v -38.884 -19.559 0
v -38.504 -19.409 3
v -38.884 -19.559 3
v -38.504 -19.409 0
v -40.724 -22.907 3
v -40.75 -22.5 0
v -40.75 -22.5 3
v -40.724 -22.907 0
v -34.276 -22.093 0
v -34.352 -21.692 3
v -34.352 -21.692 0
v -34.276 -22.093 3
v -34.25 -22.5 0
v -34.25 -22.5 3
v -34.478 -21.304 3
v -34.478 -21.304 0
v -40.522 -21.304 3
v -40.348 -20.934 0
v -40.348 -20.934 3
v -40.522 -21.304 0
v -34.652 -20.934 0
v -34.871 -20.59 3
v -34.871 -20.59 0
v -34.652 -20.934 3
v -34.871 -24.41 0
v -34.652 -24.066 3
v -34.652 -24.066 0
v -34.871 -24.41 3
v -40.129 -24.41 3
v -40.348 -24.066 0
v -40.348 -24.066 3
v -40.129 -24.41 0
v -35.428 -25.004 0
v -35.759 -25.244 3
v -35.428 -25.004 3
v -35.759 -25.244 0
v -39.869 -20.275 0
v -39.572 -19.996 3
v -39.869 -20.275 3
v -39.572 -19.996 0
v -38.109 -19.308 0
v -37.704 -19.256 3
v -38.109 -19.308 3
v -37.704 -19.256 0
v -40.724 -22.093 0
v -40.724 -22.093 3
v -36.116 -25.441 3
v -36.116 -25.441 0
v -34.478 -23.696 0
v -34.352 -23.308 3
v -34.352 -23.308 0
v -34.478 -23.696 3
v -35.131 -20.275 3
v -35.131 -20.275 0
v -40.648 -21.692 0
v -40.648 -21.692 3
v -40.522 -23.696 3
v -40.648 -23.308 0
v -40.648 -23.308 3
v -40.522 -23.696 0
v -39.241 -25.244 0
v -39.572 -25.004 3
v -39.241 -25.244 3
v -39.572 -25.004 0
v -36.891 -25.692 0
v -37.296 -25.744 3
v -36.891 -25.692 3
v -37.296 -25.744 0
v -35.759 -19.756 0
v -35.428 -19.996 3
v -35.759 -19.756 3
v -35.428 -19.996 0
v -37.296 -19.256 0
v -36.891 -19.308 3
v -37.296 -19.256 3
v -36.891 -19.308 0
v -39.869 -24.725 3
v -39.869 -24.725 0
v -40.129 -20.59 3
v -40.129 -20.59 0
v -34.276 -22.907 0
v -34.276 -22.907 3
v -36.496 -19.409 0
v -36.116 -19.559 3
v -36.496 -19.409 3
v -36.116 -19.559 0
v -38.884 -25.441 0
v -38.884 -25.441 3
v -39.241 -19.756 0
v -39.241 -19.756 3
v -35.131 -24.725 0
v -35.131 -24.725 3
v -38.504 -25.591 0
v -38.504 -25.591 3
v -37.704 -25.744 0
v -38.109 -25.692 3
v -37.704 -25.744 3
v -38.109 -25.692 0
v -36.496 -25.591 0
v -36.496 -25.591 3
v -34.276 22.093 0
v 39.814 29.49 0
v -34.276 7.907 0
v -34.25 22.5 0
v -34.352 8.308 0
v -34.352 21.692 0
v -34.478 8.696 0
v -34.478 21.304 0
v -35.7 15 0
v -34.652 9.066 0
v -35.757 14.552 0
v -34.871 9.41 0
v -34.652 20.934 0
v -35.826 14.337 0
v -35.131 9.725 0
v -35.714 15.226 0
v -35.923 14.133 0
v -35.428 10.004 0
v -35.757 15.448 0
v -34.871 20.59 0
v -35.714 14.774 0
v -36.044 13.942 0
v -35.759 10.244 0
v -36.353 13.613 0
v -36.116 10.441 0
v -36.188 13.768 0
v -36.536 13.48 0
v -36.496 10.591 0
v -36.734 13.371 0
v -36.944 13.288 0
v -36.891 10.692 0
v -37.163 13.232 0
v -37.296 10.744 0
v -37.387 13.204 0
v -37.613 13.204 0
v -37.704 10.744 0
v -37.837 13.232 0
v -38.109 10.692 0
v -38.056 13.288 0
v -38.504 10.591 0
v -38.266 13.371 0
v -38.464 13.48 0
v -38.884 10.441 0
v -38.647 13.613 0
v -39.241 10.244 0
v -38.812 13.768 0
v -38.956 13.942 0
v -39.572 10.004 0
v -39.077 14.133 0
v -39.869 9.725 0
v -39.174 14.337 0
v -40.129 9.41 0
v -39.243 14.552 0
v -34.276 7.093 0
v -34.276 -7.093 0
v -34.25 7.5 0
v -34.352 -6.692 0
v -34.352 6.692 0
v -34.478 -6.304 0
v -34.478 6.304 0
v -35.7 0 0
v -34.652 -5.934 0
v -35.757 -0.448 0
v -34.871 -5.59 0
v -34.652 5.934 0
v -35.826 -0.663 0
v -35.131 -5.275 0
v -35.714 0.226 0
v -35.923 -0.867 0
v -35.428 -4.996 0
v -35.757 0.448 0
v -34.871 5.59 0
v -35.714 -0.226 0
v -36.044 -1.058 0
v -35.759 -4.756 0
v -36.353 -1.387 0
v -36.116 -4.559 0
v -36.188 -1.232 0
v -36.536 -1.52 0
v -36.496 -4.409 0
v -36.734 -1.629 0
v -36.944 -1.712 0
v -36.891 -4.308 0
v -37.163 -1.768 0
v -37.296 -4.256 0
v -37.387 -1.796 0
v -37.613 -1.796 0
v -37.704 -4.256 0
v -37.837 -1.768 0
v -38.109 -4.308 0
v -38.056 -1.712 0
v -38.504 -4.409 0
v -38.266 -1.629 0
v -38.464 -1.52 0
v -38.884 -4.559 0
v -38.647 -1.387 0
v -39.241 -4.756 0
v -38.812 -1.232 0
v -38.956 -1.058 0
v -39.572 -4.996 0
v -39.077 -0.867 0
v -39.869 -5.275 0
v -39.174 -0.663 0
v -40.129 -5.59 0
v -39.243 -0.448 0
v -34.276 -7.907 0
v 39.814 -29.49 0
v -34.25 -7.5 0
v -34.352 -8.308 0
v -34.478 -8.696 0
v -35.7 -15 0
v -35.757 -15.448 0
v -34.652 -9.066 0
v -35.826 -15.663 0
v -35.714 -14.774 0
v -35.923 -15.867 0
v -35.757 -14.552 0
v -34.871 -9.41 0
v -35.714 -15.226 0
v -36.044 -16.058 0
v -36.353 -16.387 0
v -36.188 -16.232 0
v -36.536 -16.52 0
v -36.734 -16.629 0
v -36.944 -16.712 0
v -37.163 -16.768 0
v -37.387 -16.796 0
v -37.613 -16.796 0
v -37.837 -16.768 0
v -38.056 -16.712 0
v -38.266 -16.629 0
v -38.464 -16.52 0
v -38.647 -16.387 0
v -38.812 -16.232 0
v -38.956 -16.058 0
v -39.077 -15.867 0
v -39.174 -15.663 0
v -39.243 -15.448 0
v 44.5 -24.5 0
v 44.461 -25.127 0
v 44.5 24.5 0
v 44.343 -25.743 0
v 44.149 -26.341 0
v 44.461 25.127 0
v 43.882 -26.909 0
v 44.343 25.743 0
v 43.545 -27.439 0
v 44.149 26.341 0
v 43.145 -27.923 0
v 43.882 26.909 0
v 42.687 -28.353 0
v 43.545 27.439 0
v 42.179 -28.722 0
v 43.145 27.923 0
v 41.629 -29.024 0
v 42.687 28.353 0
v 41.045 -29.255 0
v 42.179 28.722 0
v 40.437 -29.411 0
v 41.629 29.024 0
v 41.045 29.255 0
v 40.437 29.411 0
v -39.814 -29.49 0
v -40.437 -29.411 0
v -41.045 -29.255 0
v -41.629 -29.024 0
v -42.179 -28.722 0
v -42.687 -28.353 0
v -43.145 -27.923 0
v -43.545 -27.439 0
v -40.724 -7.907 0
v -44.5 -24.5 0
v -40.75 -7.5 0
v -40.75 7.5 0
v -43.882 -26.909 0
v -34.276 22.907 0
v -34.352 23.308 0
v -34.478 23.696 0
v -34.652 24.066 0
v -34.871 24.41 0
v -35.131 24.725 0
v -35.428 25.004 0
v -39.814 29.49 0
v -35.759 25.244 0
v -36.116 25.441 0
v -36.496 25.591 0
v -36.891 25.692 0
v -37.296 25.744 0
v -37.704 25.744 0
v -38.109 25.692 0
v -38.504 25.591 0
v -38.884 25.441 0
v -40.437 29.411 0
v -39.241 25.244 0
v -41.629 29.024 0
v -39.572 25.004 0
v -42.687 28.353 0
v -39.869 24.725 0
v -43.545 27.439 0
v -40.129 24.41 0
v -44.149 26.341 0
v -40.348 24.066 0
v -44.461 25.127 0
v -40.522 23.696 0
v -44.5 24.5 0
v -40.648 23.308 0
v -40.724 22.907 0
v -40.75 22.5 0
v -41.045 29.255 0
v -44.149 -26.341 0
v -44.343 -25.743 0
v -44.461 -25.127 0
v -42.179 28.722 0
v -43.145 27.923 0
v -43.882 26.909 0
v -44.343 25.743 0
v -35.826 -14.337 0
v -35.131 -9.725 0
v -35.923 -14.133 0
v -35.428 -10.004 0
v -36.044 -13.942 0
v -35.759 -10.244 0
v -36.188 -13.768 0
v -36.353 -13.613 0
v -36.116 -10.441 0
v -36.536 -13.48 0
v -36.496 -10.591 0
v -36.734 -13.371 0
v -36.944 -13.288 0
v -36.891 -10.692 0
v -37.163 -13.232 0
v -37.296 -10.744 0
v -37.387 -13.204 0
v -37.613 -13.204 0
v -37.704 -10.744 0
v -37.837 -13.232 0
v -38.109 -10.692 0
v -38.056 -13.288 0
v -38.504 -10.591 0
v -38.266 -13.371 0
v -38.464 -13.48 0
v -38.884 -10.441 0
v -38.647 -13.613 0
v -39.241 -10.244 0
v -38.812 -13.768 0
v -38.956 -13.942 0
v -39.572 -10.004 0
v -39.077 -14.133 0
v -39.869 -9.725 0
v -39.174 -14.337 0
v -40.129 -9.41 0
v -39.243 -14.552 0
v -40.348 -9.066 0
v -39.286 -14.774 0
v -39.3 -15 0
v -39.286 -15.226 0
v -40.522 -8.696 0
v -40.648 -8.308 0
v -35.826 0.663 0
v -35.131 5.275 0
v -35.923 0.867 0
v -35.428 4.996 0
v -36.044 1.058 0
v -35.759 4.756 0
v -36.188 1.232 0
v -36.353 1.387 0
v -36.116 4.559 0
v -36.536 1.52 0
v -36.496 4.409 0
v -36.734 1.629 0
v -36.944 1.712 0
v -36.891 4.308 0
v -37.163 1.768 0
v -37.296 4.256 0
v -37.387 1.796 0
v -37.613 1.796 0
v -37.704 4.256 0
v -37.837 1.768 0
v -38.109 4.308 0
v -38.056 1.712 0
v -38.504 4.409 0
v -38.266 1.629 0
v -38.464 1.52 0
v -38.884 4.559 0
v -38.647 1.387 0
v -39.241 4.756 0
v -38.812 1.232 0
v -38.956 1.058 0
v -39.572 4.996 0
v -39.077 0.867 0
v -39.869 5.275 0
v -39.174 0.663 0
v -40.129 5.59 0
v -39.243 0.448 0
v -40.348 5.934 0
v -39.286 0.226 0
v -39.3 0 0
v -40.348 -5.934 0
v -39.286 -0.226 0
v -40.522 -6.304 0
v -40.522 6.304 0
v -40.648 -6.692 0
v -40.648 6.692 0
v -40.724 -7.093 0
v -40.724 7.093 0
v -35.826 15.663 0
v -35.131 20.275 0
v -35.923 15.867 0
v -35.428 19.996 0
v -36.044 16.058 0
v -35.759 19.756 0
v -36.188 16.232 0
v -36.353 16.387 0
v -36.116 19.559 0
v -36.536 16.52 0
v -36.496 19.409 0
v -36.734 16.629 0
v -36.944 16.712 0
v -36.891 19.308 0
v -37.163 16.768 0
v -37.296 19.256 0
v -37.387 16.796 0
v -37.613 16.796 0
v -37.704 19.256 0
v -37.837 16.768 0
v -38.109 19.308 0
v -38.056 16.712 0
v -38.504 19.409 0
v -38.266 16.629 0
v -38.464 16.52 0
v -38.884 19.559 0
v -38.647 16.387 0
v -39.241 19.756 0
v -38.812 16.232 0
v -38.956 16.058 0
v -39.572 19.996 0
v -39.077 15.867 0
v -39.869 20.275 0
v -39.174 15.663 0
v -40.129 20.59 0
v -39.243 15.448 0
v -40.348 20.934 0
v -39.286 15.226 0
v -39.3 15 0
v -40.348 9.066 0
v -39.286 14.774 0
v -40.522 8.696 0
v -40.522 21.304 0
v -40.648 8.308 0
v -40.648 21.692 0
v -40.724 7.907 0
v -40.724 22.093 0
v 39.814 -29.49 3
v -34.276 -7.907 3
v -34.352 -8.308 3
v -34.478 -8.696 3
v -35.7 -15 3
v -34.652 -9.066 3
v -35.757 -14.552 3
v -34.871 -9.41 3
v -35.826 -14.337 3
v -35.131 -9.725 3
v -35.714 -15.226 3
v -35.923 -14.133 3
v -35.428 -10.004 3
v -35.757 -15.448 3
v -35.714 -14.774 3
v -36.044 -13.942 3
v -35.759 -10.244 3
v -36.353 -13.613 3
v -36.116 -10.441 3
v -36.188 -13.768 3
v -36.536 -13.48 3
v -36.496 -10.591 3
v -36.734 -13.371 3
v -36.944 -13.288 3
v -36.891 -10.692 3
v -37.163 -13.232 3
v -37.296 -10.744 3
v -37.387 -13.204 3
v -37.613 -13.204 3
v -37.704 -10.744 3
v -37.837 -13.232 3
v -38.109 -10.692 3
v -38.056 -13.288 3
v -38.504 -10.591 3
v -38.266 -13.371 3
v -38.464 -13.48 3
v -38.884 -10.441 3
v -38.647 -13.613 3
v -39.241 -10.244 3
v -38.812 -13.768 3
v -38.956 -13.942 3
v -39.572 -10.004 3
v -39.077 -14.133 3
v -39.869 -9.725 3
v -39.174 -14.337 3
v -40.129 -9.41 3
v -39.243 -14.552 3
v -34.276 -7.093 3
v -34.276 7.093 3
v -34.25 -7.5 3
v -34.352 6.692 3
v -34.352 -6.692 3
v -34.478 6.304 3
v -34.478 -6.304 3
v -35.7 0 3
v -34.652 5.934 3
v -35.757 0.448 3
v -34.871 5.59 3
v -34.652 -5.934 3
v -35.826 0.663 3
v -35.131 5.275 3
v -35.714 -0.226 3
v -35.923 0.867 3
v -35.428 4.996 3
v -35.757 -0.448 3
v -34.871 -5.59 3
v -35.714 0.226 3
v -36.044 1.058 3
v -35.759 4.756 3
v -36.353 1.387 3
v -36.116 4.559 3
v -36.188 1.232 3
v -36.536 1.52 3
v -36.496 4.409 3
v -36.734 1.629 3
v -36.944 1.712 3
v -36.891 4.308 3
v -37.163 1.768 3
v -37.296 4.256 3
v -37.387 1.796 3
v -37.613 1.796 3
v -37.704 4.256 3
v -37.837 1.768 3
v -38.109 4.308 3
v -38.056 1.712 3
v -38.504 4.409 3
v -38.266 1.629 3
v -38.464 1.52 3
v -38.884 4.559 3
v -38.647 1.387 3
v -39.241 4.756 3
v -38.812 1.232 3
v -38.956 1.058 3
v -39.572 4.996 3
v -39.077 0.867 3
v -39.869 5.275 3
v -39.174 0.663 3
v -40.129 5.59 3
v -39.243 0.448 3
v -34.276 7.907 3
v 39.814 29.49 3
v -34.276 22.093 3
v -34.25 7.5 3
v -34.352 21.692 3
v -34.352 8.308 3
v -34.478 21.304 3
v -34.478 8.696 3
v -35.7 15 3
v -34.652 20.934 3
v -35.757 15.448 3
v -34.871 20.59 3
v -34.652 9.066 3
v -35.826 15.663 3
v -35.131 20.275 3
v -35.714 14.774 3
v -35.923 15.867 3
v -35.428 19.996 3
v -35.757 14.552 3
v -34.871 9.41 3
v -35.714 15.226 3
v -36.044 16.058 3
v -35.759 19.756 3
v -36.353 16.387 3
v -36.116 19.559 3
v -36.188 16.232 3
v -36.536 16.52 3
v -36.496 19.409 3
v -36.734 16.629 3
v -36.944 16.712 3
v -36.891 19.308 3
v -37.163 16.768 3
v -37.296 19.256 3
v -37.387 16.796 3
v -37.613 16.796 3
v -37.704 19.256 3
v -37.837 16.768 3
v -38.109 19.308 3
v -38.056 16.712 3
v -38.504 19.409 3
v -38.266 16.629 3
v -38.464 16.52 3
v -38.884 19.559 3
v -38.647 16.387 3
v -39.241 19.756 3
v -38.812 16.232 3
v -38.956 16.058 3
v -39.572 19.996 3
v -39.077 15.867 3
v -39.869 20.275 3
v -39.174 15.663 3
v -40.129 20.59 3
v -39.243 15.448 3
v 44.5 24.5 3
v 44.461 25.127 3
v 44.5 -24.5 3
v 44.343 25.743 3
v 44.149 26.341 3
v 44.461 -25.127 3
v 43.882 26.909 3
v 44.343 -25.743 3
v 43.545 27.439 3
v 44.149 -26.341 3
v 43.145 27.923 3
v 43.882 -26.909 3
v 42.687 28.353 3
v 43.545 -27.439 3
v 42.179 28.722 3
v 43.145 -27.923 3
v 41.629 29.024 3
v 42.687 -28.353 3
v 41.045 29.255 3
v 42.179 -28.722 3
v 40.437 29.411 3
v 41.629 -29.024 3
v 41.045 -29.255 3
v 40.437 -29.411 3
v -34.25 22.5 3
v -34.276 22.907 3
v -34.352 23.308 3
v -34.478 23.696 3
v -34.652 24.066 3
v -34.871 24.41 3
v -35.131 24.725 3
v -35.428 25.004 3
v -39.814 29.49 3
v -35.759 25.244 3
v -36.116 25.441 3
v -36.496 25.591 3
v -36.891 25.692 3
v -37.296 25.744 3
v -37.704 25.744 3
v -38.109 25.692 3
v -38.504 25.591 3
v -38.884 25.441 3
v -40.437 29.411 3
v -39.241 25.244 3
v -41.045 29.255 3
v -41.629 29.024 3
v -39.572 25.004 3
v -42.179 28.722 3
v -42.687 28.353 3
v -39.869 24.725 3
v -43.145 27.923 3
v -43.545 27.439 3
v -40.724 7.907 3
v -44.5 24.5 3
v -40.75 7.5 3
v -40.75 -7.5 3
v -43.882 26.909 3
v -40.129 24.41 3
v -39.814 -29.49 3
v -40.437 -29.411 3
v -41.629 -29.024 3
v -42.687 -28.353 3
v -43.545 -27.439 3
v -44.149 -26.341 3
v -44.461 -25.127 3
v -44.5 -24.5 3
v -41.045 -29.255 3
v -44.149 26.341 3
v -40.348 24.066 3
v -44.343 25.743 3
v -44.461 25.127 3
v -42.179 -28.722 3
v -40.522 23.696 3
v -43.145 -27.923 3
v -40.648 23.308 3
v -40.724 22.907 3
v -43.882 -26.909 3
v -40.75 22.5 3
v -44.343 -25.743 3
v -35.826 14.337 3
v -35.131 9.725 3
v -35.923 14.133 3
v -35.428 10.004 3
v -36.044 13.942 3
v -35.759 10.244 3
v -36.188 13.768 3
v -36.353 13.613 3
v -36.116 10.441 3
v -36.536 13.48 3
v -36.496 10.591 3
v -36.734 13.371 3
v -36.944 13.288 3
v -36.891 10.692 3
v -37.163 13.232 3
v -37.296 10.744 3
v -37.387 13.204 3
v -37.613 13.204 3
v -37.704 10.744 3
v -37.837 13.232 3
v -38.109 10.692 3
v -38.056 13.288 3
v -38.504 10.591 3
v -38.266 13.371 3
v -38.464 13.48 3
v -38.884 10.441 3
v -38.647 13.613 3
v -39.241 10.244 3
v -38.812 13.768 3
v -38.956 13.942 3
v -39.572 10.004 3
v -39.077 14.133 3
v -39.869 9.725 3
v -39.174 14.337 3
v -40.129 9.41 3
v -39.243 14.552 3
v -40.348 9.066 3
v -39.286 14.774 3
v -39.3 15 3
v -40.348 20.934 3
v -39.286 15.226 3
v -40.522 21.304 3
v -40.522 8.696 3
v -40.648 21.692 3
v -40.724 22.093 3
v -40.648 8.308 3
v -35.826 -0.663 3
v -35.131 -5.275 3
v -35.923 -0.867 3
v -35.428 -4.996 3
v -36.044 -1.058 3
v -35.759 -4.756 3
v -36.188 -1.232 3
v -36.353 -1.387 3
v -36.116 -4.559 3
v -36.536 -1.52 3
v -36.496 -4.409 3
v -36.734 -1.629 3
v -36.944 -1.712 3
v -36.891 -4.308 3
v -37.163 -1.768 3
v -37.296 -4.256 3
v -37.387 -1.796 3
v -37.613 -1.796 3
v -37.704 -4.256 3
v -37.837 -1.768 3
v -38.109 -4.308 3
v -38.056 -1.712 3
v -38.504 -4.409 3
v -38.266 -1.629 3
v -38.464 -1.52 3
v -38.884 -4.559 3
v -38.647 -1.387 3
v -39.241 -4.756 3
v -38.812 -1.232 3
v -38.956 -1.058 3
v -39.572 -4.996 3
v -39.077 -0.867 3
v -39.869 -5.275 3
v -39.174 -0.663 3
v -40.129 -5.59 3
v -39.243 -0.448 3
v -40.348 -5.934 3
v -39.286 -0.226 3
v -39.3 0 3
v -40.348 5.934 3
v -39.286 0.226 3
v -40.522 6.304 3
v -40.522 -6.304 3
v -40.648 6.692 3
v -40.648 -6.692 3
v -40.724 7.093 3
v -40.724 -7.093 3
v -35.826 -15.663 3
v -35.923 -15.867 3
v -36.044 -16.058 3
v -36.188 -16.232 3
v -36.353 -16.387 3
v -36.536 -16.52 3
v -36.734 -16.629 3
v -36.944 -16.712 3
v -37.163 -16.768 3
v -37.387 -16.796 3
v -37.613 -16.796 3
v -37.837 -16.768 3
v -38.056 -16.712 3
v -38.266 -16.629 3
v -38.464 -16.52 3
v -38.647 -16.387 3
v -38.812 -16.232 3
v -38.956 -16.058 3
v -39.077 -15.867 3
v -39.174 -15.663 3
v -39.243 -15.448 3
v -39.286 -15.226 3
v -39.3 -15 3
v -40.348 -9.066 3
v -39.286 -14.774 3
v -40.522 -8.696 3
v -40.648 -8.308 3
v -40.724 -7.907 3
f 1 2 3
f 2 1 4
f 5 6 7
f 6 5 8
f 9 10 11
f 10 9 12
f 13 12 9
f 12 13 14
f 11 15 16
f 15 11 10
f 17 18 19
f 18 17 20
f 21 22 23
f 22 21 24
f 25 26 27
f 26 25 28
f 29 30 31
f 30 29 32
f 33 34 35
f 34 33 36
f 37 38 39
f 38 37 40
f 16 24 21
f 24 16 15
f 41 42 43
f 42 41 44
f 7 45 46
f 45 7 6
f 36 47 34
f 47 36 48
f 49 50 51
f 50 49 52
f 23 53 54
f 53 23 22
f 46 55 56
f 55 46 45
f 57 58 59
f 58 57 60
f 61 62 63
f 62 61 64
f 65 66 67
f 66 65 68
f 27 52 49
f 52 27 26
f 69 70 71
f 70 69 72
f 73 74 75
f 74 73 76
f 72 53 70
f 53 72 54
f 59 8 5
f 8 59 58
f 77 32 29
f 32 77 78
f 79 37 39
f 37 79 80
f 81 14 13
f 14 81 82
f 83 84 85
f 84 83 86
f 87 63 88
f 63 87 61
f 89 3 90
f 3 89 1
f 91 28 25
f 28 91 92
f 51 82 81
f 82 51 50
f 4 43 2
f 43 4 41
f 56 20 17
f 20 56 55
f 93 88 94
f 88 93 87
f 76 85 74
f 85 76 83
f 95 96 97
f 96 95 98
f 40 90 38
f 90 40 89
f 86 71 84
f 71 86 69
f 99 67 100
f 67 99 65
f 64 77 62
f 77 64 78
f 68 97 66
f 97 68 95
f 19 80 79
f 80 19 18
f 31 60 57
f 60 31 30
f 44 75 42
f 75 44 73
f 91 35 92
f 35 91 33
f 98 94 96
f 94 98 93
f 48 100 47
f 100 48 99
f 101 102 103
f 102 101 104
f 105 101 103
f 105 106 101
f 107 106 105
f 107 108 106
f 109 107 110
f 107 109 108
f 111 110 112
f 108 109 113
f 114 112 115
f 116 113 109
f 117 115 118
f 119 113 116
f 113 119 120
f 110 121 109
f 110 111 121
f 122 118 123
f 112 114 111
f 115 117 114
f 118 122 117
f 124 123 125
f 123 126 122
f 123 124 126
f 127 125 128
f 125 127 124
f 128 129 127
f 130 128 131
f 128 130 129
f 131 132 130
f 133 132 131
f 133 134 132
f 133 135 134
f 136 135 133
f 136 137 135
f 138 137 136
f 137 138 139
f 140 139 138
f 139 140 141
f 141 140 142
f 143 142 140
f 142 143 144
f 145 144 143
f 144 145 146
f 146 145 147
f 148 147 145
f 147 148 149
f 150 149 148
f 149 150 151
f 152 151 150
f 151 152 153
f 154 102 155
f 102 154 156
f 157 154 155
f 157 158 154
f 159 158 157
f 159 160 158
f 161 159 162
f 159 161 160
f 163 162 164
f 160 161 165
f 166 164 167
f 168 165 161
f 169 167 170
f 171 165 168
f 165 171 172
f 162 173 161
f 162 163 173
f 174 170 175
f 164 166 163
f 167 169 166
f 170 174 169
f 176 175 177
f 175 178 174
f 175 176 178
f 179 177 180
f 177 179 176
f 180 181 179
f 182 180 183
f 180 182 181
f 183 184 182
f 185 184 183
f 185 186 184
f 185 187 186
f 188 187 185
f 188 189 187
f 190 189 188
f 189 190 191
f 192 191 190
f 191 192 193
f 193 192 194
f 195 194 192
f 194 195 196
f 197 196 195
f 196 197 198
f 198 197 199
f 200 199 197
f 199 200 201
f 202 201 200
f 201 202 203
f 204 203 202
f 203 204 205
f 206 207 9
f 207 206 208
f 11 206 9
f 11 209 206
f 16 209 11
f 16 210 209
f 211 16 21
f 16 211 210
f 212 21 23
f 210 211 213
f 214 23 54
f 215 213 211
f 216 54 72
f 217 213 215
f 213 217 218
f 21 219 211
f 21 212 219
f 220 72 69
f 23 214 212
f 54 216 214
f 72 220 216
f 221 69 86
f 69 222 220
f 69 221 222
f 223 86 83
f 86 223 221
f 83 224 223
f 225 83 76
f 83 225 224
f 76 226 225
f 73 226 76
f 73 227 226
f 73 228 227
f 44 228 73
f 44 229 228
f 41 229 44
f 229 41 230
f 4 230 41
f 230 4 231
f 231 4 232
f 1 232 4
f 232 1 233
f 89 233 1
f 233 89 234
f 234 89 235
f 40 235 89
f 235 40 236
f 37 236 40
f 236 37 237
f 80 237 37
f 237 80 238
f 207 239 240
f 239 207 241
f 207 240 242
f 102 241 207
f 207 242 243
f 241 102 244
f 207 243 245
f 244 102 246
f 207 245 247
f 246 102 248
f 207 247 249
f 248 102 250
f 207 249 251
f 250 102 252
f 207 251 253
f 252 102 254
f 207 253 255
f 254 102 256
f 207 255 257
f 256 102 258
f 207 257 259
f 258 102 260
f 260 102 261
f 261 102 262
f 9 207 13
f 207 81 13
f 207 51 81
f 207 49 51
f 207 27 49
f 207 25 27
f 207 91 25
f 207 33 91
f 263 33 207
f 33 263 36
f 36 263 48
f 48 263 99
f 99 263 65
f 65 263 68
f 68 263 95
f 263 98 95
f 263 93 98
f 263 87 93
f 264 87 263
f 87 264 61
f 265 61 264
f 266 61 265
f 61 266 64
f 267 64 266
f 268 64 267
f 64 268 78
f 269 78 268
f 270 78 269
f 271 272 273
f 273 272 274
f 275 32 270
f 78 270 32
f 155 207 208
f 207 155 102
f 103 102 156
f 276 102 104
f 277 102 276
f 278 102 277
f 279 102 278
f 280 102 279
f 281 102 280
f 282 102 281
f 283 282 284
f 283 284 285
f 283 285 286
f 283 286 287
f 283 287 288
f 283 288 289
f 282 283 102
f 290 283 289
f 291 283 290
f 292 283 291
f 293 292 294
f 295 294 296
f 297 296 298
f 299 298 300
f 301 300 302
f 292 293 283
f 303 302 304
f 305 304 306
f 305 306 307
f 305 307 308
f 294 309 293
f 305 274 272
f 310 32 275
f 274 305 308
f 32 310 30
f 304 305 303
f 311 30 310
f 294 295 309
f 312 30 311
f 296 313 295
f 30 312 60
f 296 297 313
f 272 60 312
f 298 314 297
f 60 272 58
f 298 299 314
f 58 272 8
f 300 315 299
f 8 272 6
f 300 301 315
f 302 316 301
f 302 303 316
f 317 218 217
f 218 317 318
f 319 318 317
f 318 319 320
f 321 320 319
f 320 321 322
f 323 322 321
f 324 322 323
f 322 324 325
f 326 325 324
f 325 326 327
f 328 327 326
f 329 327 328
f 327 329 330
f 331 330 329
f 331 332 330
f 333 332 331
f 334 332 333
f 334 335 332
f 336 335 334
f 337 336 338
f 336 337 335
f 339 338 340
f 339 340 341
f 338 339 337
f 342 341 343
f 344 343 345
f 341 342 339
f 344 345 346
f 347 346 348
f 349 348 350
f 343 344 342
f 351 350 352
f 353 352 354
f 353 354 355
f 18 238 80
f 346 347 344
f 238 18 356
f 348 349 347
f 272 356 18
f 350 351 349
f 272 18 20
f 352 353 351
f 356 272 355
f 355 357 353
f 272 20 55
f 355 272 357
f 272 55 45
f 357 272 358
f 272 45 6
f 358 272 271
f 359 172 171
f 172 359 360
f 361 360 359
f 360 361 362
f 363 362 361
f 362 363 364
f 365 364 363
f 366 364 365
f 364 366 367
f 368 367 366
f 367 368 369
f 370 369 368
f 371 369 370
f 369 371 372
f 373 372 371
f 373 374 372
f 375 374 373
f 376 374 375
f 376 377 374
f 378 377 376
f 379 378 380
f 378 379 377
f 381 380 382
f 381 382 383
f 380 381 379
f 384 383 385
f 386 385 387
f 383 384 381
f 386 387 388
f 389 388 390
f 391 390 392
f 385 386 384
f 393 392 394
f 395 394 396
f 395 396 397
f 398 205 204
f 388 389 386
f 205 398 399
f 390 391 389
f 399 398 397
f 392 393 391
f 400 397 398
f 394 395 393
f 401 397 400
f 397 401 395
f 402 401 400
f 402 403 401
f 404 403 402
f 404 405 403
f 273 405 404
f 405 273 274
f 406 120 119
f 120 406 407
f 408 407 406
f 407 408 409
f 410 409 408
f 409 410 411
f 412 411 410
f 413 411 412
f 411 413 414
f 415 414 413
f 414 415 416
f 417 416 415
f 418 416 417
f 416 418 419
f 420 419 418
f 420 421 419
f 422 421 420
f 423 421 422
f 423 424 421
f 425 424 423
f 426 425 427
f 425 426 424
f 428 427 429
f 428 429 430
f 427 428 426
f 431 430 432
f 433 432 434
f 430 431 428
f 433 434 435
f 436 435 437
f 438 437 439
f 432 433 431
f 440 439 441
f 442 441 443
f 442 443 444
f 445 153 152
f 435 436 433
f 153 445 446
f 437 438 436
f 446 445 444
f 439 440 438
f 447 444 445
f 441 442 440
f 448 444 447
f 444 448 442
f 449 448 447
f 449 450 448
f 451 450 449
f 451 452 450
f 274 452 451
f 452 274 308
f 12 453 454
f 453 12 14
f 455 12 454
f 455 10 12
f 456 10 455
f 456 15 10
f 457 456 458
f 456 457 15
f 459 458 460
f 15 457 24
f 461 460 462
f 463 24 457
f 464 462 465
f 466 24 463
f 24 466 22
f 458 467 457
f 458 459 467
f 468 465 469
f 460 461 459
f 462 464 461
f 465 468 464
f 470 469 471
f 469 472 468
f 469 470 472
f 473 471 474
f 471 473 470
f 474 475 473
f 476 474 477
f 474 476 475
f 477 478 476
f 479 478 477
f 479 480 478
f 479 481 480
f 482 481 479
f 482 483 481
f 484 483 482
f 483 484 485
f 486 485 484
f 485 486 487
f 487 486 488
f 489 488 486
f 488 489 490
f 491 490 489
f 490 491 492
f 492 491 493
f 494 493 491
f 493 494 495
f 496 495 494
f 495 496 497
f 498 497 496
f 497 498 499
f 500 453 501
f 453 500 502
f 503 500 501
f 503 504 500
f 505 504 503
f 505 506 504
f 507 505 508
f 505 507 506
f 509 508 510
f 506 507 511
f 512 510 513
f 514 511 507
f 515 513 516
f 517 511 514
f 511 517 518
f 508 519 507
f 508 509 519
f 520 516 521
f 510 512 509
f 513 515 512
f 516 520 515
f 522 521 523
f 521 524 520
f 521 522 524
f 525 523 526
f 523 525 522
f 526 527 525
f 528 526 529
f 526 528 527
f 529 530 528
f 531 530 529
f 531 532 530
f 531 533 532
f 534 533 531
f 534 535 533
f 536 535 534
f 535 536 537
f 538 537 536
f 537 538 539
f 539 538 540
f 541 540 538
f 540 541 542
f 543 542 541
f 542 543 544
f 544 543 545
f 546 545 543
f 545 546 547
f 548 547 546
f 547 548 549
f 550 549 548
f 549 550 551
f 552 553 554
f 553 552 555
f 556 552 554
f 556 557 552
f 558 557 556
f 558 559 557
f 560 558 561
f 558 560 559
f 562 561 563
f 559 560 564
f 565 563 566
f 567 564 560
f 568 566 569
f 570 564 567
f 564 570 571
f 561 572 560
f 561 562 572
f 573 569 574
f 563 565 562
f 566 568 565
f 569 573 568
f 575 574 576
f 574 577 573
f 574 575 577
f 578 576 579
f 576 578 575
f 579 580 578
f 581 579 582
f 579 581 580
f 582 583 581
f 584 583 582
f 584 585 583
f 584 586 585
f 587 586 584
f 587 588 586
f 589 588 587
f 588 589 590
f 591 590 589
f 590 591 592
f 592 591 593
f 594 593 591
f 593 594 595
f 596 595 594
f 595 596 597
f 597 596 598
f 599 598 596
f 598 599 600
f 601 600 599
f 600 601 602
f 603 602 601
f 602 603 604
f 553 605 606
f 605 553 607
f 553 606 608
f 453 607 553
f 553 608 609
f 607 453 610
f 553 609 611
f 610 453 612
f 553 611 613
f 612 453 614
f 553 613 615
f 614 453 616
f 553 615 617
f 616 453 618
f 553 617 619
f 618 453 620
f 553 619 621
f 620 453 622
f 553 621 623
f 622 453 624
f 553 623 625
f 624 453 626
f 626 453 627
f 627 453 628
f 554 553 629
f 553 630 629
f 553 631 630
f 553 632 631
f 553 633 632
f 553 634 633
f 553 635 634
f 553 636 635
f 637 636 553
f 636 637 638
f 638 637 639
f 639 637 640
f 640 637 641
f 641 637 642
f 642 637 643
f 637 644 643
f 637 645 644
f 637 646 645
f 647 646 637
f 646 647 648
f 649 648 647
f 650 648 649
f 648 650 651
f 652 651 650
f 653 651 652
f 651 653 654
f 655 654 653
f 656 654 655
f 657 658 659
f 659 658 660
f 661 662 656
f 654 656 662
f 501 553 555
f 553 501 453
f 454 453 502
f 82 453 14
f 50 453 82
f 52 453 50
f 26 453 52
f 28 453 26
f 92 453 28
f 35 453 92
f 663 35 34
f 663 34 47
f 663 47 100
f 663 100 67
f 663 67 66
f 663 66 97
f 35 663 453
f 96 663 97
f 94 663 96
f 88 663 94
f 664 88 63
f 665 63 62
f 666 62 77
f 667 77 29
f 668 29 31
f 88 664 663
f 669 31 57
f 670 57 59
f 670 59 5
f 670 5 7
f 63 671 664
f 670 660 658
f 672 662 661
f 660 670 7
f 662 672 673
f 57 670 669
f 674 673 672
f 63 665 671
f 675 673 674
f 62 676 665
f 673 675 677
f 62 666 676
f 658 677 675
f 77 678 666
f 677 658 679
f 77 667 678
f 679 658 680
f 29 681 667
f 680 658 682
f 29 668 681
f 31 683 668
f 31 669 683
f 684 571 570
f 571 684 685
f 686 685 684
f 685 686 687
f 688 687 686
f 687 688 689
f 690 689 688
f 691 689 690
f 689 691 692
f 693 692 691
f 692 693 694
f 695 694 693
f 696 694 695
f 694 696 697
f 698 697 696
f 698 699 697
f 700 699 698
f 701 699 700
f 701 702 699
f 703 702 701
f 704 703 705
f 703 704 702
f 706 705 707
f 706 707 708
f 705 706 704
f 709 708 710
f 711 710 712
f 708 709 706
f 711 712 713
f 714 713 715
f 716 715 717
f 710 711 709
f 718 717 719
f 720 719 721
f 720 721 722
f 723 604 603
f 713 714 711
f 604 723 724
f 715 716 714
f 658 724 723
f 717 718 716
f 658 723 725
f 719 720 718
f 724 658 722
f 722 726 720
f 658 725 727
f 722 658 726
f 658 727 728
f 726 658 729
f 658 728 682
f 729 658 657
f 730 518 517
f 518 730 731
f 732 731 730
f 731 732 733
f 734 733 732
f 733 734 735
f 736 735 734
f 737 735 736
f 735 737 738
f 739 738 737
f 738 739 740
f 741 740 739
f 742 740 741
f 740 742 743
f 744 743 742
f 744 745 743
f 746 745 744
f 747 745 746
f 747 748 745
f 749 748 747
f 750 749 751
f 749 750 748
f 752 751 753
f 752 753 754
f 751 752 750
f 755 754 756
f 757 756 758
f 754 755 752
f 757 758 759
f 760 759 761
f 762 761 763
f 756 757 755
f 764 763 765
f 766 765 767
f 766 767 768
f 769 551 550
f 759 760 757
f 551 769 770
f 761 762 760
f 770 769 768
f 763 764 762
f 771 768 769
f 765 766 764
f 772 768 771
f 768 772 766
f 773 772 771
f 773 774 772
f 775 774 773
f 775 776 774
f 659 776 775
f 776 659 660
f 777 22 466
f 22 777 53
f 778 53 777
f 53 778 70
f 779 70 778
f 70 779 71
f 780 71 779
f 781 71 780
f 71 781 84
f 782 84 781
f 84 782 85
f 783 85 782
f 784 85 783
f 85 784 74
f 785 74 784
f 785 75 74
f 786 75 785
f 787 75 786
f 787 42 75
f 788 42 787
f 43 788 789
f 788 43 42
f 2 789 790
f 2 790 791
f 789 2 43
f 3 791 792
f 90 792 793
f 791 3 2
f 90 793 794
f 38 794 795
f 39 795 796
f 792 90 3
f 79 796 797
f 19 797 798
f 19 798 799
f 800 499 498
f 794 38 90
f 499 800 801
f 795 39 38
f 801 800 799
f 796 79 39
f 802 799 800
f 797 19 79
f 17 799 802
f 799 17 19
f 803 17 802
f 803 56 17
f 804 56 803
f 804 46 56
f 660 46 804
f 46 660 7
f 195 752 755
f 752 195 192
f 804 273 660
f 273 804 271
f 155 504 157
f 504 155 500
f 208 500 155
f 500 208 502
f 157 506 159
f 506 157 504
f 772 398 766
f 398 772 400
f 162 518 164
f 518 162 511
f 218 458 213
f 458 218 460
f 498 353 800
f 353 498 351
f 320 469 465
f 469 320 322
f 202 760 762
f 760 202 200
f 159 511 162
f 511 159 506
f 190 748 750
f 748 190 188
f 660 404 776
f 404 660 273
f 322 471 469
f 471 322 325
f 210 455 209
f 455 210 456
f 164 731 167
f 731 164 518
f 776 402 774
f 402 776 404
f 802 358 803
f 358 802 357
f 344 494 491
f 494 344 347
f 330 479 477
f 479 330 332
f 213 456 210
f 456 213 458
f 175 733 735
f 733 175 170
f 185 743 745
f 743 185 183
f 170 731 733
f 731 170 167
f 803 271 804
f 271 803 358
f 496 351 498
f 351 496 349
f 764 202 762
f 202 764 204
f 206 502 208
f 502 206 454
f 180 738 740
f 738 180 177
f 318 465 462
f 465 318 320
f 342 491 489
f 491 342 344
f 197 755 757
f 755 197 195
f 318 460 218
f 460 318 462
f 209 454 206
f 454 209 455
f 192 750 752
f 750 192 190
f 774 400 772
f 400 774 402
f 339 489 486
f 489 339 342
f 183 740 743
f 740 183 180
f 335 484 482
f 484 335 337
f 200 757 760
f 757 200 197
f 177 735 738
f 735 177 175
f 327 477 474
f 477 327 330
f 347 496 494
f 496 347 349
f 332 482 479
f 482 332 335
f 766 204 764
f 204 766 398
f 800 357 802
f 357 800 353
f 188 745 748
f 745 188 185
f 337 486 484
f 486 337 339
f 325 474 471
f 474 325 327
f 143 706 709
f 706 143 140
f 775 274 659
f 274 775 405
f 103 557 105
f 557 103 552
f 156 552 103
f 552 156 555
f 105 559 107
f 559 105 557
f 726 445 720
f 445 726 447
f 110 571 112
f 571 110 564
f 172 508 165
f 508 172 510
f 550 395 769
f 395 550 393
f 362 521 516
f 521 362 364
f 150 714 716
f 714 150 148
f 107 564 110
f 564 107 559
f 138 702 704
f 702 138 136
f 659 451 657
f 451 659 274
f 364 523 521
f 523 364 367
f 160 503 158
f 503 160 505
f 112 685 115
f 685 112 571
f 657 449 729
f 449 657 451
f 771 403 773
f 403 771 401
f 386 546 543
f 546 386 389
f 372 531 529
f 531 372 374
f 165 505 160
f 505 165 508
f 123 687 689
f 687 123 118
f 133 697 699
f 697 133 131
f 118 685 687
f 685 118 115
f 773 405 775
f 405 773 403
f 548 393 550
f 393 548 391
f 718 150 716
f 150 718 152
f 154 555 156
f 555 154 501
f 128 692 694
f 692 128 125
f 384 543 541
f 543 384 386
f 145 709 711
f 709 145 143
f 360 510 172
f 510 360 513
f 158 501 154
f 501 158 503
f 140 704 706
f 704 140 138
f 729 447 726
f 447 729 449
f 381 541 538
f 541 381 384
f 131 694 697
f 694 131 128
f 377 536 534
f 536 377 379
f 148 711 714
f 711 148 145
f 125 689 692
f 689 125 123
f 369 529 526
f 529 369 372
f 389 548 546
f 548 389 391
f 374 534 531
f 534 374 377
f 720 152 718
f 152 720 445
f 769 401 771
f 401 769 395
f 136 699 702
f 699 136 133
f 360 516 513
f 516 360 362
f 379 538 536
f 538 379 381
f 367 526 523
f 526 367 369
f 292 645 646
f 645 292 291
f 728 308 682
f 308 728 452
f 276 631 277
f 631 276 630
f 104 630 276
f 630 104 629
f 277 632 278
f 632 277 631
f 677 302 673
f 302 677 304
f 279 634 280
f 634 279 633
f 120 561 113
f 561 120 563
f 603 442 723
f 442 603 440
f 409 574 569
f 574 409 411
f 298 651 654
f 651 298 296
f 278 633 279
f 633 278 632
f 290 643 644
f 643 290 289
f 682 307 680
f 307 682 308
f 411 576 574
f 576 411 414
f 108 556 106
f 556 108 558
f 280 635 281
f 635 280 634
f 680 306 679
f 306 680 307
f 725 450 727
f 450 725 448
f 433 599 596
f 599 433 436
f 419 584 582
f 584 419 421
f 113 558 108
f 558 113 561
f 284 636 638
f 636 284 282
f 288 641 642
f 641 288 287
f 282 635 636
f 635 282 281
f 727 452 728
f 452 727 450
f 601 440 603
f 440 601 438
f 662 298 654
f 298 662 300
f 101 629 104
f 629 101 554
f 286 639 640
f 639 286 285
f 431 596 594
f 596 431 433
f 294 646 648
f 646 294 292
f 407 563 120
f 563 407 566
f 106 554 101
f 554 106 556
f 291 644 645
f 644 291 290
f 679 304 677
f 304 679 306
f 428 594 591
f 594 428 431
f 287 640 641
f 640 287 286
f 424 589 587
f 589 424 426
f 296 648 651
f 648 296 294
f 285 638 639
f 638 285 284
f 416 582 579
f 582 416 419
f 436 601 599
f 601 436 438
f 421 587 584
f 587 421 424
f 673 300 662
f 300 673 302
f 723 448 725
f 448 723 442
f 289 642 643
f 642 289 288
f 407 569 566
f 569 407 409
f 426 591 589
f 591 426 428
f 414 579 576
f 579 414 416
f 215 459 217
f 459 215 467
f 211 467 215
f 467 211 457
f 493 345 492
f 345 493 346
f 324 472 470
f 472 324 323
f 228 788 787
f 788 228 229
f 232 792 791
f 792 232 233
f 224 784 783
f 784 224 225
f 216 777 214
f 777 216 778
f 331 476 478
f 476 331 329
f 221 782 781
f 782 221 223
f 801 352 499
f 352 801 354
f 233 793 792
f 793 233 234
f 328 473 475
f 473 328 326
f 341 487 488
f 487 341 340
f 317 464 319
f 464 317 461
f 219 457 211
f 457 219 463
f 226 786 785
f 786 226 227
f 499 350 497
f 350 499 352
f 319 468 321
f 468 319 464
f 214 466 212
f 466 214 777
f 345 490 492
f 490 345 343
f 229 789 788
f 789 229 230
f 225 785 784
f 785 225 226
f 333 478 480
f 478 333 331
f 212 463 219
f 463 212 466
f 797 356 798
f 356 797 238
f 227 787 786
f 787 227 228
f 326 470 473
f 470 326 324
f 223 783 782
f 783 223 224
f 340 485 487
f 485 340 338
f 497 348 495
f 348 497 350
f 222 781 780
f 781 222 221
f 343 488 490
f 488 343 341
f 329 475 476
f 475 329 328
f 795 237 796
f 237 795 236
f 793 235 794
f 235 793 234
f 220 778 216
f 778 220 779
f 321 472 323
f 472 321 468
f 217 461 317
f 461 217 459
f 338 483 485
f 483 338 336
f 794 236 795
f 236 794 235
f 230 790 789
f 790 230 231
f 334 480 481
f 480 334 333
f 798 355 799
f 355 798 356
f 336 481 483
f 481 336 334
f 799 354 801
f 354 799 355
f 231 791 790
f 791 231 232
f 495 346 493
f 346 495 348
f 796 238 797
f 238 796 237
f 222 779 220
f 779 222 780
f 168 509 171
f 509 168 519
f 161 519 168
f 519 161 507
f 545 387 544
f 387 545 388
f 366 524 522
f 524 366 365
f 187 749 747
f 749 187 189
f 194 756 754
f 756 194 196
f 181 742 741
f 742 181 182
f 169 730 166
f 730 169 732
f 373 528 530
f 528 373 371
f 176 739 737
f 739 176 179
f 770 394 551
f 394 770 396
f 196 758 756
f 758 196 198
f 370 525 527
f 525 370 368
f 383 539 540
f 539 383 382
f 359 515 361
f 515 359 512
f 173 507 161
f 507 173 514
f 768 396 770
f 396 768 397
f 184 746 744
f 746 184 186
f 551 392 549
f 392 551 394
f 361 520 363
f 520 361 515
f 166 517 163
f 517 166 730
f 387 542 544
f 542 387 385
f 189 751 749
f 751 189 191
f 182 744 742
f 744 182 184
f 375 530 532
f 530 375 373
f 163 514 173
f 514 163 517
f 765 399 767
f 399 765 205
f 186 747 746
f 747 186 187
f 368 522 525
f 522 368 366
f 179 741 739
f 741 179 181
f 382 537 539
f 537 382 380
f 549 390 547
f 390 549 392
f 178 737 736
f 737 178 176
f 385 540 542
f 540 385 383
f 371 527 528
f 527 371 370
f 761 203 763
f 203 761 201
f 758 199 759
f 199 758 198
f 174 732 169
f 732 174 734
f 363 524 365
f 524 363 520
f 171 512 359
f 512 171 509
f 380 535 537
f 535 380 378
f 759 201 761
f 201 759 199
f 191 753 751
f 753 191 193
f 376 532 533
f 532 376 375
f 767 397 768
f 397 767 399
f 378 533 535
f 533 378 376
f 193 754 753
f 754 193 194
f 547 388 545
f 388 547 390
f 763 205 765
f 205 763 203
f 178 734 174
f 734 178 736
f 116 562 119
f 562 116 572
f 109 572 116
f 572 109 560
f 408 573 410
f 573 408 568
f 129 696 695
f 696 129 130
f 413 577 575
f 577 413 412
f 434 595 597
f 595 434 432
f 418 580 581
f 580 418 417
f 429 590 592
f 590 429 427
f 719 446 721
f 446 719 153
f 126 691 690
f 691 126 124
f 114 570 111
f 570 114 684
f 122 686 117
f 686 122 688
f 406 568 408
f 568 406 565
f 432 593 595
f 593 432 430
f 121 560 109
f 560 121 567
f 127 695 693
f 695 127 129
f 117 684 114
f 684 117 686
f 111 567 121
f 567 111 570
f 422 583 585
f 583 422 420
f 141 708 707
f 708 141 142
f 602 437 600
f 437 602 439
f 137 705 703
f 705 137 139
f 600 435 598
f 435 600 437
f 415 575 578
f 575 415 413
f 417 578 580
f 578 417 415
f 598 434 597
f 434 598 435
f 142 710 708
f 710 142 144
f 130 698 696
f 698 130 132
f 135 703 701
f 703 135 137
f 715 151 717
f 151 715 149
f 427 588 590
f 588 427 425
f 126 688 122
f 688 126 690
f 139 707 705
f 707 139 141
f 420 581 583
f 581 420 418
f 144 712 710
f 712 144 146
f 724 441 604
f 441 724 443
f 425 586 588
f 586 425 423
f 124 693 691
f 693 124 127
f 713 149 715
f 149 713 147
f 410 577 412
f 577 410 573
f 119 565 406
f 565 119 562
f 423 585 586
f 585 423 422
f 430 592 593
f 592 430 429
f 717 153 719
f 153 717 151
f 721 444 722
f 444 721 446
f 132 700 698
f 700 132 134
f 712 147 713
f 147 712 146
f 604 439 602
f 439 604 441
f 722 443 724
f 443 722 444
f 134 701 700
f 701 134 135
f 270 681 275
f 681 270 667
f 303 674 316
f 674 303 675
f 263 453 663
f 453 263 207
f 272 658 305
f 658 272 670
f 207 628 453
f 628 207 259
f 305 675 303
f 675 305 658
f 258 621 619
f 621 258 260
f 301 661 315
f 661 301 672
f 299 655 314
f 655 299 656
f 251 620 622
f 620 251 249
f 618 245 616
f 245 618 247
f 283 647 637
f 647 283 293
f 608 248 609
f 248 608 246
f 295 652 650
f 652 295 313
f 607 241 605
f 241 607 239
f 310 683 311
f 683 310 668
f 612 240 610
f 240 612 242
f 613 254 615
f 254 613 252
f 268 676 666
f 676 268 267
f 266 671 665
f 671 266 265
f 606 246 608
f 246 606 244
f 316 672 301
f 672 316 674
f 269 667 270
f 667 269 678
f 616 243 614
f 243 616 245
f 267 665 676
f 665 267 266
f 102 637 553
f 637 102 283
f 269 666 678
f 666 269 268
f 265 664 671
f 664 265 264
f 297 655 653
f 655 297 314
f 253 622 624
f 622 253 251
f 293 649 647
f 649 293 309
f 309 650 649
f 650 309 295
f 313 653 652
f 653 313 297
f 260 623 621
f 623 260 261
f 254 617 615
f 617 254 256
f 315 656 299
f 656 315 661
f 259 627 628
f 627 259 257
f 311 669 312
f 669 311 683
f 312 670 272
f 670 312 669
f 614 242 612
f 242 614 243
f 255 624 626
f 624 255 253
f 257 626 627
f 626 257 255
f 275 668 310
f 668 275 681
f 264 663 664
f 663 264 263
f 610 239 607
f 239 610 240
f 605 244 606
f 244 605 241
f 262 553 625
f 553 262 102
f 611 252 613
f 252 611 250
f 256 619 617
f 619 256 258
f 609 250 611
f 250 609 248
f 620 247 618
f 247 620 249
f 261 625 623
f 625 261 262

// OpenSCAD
$fn = 50;


difference() {
	union() {
		hull() {
			translate(v = [-39.5000000000, 24.5000000000, 0]) {
				cylinder(h = 3, r = 5);
			}
			translate(v = [39.5000000000, 24.5000000000, 0]) {
				cylinder(h = 3, r = 5);
			}
			translate(v = [-39.5000000000, -24.5000000000, 0]) {
				cylinder(h = 3, r = 5);
			}
			translate(v = [39.5000000000, -24.5000000000, 0]) {
				cylinder(h = 3, r = 5);
			}
		}
	}
	union() {
		translate(v = [-37.5000000000, -22.5000000000, 0]) {
			cylinder(h = 3, r = 3.2500000000);
		}
		translate(v = [-37.5000000000, -7.5000000000, 0]) {
			cylinder(h = 3, r = 3.2500000000);
		}
		translate(v = [-37.5000000000, 7.5000000000, 0]) {
			cylinder(h = 3, r = 3.2500000000);
		}
		translate(v = [-37.5000000000, 22.5000000000, 0]) {
			cylinder(h = 3, r = 3.2500000000);
		}
		translate(v = [-37.5000000000, -22.5000000000, 0]) {
			cylinder(h = 3, r = 1.8000000000);
		}
		translate(v = [-37.5000000000, -15.0000000000, 0]) {
			cylinder(h = 3, r = 1.8000000000);
		}
		translate(v = [-37.5000000000, -7.5000000000, 0]) {
			cylinder(h = 3, r = 1.8000000000);
		}
		translate(v = [-37.5000000000, 0.0000000000, 0]) {
			cylinder(h = 3, r = 1.8000000000);
		}
		translate(v = [-37.5000000000, 7.5000000000, 0]) {
			cylinder(h = 3, r = 1.8000000000);
		}
		translate(v = [-37.5000000000, 15.0000000000, 0]) {
			cylinder(h = 3, r = 1.8000000000);
		}
		translate(v = [-37.5000000000, 22.5000000000, 0]) {
			cylinder(h = 3, r = 1.8000000000);
		}
		translate(v = [-37.5000000000, -22.5000000000, 0]) {
			cylinder(h = 3, r = 1.8000000000);
		}
		translate(v = [-37.5000000000, -15.0000000000, 0]) {
			cylinder(h = 3, r = 1.8000000000);
		}
		translate(v = [-37.5000000000, -7.5000000000, 0]) {
			cylinder(h = 3, r = 1.8000000000);
		}
		translate(v = [-37.5000000000, 0.0000000000, 0]) {
			cylinder(h = 3, r = 1.8000000000);
		}
		translate(v = [-37.5000000000, 7.5000000000, 0]) {
			cylinder(h = 3, r = 1.8000000000);
		}
		translate(v = [-37.5000000000, 15.0000000000, 0]) {
			cylinder(h = 3, r = 1.8000000000);
		}
		translate(v = [-37.5000000000, 22.5000000000, 0]) {
			cylinder(h = 3, r = 1.8000000000);
		}
		translate(v = [-37.5000000000, -22.5000000000, 0]) {
			cylinder(h = 3, r = 1.8000000000);
		}
		translate(v = [-37.5000000000, -15.0000000000, 0]) {
			cylinder(h = 3, r = 1.8000000000);
		}
		translate(v = [-37.5000000000, -7.5000000000, 0]) {
			cylinder(h = 3, r = 1.8000000000);
		}
		translate(v = [-37.5000000000, 0.0000000000, 0]) {
			cylinder(h = 3, r = 1.8000000000);
		}
		translate(v = [-37.5000000000, 7.5000000000, 0]) {
			cylinder(h = 3, r = 1.8000000000);
		}
		translate(v = [-37.5000000000, 15.0000000000, 0]) {
			cylinder(h = 3, r = 1.8000000000);
		}
		translate(v = [-37.5000000000, 22.5000000000, 0]) {
			cylinder(h = 3, r = 1.8000000000);
		}
	}
}
